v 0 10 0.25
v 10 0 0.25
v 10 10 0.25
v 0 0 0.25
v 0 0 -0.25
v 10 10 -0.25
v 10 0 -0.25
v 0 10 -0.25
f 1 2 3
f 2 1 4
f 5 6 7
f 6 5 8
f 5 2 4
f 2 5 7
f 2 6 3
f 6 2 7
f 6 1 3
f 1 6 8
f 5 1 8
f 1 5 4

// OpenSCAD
module makeFloor(cube_size) {
    translate([cube_size / 2, cube_size / 2, 0])
    cube([cube_size, cube_size, 0.5], center = true);
}
makeFloor(10);
